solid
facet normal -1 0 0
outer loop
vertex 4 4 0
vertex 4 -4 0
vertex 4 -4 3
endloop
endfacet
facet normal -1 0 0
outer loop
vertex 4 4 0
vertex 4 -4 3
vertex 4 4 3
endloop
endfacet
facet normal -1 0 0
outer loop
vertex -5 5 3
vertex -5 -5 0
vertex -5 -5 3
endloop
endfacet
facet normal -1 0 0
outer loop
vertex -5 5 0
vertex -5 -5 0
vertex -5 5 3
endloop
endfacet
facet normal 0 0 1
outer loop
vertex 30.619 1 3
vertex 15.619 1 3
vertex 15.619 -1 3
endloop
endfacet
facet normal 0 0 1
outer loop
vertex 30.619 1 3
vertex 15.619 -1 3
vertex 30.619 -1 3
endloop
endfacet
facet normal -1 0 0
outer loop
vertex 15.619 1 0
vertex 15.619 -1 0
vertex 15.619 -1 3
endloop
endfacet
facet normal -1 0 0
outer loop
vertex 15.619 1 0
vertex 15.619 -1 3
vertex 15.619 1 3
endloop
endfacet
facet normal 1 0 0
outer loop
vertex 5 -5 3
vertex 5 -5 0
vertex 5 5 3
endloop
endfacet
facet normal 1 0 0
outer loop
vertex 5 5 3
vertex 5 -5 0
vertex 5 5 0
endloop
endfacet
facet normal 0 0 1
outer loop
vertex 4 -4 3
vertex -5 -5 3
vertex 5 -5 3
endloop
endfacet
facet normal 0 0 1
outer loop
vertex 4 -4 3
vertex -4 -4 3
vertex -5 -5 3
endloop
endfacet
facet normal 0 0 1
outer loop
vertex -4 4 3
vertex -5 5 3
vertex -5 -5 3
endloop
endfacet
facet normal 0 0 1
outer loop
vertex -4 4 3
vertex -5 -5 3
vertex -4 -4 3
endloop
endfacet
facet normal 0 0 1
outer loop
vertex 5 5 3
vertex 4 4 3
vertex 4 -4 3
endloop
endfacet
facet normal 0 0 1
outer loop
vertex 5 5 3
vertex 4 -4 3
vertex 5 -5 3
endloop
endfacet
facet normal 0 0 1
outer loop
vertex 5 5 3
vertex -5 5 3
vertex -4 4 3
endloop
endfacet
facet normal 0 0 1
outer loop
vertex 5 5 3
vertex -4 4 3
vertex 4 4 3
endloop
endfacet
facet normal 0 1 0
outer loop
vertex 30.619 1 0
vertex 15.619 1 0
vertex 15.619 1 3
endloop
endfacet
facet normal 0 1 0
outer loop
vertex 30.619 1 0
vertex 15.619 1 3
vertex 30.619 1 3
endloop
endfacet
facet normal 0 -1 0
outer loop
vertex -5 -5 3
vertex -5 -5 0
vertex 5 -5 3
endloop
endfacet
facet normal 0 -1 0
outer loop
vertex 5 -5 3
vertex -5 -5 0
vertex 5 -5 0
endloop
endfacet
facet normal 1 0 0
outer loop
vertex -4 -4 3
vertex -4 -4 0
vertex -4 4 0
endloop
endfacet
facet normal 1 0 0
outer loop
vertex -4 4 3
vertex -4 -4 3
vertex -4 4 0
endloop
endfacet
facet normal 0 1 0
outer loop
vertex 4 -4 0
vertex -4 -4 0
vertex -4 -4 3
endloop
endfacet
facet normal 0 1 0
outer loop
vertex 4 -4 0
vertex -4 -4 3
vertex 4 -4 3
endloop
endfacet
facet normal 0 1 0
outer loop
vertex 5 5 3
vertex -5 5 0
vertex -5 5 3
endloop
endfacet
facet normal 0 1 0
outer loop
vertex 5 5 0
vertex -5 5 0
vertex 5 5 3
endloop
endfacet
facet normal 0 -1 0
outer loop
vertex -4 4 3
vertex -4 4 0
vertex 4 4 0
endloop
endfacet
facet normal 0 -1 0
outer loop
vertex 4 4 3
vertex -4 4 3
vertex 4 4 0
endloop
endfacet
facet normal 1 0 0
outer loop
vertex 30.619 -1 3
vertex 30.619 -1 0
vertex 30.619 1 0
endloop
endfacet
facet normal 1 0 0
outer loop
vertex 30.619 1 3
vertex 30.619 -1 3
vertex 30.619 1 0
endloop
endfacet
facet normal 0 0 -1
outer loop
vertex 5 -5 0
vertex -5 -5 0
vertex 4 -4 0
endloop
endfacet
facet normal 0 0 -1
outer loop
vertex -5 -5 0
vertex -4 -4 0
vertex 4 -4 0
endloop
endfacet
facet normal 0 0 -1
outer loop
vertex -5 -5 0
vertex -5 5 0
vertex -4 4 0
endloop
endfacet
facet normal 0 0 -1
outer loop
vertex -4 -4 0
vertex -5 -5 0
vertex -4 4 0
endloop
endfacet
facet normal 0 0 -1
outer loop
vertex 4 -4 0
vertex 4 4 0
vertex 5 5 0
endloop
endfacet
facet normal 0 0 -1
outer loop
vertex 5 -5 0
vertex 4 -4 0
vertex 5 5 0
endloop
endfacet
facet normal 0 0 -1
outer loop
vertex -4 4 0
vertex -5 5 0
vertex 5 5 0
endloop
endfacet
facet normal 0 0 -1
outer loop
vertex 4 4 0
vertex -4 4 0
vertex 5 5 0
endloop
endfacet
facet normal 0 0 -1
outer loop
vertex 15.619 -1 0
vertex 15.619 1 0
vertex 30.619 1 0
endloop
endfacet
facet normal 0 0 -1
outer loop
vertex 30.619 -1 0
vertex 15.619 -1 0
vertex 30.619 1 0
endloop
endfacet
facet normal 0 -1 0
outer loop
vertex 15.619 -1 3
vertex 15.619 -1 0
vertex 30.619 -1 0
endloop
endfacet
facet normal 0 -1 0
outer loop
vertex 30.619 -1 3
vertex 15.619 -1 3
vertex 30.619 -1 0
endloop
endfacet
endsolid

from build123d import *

# Parameters (mm, degrees)
F0_W     = 10
F0_H     = 10
F0_W_2   = 8
F0_H_2   = 8
F1_DEPTH = 2
F0_W_3   = 15
F0_H_3   = 2
F2_DEPTH = 3


with BuildPart() as f1:
    # F0 (on Top) → F1 (new body)
    with BuildSketch(Plane.XY):
        Rectangle(F0_W, F0_H)
        Rectangle(F0_W_2, F0_H_2, mode=Mode.SUBTRACT)
    extrude(amount=F1_DEPTH)

    # F0 (on Top) → F2 (join)
    with BuildSketch(Plane.XY):
        Rectangle(F0_W, F0_H)
        Rectangle(F0_W_2, F0_H_2, mode=Mode.SUBTRACT)
        with Locations((23.119159, 0)):
            Rectangle(F0_W_3, F0_H_3)
    extrude(amount=F2_DEPTH)


solid = f1.part
